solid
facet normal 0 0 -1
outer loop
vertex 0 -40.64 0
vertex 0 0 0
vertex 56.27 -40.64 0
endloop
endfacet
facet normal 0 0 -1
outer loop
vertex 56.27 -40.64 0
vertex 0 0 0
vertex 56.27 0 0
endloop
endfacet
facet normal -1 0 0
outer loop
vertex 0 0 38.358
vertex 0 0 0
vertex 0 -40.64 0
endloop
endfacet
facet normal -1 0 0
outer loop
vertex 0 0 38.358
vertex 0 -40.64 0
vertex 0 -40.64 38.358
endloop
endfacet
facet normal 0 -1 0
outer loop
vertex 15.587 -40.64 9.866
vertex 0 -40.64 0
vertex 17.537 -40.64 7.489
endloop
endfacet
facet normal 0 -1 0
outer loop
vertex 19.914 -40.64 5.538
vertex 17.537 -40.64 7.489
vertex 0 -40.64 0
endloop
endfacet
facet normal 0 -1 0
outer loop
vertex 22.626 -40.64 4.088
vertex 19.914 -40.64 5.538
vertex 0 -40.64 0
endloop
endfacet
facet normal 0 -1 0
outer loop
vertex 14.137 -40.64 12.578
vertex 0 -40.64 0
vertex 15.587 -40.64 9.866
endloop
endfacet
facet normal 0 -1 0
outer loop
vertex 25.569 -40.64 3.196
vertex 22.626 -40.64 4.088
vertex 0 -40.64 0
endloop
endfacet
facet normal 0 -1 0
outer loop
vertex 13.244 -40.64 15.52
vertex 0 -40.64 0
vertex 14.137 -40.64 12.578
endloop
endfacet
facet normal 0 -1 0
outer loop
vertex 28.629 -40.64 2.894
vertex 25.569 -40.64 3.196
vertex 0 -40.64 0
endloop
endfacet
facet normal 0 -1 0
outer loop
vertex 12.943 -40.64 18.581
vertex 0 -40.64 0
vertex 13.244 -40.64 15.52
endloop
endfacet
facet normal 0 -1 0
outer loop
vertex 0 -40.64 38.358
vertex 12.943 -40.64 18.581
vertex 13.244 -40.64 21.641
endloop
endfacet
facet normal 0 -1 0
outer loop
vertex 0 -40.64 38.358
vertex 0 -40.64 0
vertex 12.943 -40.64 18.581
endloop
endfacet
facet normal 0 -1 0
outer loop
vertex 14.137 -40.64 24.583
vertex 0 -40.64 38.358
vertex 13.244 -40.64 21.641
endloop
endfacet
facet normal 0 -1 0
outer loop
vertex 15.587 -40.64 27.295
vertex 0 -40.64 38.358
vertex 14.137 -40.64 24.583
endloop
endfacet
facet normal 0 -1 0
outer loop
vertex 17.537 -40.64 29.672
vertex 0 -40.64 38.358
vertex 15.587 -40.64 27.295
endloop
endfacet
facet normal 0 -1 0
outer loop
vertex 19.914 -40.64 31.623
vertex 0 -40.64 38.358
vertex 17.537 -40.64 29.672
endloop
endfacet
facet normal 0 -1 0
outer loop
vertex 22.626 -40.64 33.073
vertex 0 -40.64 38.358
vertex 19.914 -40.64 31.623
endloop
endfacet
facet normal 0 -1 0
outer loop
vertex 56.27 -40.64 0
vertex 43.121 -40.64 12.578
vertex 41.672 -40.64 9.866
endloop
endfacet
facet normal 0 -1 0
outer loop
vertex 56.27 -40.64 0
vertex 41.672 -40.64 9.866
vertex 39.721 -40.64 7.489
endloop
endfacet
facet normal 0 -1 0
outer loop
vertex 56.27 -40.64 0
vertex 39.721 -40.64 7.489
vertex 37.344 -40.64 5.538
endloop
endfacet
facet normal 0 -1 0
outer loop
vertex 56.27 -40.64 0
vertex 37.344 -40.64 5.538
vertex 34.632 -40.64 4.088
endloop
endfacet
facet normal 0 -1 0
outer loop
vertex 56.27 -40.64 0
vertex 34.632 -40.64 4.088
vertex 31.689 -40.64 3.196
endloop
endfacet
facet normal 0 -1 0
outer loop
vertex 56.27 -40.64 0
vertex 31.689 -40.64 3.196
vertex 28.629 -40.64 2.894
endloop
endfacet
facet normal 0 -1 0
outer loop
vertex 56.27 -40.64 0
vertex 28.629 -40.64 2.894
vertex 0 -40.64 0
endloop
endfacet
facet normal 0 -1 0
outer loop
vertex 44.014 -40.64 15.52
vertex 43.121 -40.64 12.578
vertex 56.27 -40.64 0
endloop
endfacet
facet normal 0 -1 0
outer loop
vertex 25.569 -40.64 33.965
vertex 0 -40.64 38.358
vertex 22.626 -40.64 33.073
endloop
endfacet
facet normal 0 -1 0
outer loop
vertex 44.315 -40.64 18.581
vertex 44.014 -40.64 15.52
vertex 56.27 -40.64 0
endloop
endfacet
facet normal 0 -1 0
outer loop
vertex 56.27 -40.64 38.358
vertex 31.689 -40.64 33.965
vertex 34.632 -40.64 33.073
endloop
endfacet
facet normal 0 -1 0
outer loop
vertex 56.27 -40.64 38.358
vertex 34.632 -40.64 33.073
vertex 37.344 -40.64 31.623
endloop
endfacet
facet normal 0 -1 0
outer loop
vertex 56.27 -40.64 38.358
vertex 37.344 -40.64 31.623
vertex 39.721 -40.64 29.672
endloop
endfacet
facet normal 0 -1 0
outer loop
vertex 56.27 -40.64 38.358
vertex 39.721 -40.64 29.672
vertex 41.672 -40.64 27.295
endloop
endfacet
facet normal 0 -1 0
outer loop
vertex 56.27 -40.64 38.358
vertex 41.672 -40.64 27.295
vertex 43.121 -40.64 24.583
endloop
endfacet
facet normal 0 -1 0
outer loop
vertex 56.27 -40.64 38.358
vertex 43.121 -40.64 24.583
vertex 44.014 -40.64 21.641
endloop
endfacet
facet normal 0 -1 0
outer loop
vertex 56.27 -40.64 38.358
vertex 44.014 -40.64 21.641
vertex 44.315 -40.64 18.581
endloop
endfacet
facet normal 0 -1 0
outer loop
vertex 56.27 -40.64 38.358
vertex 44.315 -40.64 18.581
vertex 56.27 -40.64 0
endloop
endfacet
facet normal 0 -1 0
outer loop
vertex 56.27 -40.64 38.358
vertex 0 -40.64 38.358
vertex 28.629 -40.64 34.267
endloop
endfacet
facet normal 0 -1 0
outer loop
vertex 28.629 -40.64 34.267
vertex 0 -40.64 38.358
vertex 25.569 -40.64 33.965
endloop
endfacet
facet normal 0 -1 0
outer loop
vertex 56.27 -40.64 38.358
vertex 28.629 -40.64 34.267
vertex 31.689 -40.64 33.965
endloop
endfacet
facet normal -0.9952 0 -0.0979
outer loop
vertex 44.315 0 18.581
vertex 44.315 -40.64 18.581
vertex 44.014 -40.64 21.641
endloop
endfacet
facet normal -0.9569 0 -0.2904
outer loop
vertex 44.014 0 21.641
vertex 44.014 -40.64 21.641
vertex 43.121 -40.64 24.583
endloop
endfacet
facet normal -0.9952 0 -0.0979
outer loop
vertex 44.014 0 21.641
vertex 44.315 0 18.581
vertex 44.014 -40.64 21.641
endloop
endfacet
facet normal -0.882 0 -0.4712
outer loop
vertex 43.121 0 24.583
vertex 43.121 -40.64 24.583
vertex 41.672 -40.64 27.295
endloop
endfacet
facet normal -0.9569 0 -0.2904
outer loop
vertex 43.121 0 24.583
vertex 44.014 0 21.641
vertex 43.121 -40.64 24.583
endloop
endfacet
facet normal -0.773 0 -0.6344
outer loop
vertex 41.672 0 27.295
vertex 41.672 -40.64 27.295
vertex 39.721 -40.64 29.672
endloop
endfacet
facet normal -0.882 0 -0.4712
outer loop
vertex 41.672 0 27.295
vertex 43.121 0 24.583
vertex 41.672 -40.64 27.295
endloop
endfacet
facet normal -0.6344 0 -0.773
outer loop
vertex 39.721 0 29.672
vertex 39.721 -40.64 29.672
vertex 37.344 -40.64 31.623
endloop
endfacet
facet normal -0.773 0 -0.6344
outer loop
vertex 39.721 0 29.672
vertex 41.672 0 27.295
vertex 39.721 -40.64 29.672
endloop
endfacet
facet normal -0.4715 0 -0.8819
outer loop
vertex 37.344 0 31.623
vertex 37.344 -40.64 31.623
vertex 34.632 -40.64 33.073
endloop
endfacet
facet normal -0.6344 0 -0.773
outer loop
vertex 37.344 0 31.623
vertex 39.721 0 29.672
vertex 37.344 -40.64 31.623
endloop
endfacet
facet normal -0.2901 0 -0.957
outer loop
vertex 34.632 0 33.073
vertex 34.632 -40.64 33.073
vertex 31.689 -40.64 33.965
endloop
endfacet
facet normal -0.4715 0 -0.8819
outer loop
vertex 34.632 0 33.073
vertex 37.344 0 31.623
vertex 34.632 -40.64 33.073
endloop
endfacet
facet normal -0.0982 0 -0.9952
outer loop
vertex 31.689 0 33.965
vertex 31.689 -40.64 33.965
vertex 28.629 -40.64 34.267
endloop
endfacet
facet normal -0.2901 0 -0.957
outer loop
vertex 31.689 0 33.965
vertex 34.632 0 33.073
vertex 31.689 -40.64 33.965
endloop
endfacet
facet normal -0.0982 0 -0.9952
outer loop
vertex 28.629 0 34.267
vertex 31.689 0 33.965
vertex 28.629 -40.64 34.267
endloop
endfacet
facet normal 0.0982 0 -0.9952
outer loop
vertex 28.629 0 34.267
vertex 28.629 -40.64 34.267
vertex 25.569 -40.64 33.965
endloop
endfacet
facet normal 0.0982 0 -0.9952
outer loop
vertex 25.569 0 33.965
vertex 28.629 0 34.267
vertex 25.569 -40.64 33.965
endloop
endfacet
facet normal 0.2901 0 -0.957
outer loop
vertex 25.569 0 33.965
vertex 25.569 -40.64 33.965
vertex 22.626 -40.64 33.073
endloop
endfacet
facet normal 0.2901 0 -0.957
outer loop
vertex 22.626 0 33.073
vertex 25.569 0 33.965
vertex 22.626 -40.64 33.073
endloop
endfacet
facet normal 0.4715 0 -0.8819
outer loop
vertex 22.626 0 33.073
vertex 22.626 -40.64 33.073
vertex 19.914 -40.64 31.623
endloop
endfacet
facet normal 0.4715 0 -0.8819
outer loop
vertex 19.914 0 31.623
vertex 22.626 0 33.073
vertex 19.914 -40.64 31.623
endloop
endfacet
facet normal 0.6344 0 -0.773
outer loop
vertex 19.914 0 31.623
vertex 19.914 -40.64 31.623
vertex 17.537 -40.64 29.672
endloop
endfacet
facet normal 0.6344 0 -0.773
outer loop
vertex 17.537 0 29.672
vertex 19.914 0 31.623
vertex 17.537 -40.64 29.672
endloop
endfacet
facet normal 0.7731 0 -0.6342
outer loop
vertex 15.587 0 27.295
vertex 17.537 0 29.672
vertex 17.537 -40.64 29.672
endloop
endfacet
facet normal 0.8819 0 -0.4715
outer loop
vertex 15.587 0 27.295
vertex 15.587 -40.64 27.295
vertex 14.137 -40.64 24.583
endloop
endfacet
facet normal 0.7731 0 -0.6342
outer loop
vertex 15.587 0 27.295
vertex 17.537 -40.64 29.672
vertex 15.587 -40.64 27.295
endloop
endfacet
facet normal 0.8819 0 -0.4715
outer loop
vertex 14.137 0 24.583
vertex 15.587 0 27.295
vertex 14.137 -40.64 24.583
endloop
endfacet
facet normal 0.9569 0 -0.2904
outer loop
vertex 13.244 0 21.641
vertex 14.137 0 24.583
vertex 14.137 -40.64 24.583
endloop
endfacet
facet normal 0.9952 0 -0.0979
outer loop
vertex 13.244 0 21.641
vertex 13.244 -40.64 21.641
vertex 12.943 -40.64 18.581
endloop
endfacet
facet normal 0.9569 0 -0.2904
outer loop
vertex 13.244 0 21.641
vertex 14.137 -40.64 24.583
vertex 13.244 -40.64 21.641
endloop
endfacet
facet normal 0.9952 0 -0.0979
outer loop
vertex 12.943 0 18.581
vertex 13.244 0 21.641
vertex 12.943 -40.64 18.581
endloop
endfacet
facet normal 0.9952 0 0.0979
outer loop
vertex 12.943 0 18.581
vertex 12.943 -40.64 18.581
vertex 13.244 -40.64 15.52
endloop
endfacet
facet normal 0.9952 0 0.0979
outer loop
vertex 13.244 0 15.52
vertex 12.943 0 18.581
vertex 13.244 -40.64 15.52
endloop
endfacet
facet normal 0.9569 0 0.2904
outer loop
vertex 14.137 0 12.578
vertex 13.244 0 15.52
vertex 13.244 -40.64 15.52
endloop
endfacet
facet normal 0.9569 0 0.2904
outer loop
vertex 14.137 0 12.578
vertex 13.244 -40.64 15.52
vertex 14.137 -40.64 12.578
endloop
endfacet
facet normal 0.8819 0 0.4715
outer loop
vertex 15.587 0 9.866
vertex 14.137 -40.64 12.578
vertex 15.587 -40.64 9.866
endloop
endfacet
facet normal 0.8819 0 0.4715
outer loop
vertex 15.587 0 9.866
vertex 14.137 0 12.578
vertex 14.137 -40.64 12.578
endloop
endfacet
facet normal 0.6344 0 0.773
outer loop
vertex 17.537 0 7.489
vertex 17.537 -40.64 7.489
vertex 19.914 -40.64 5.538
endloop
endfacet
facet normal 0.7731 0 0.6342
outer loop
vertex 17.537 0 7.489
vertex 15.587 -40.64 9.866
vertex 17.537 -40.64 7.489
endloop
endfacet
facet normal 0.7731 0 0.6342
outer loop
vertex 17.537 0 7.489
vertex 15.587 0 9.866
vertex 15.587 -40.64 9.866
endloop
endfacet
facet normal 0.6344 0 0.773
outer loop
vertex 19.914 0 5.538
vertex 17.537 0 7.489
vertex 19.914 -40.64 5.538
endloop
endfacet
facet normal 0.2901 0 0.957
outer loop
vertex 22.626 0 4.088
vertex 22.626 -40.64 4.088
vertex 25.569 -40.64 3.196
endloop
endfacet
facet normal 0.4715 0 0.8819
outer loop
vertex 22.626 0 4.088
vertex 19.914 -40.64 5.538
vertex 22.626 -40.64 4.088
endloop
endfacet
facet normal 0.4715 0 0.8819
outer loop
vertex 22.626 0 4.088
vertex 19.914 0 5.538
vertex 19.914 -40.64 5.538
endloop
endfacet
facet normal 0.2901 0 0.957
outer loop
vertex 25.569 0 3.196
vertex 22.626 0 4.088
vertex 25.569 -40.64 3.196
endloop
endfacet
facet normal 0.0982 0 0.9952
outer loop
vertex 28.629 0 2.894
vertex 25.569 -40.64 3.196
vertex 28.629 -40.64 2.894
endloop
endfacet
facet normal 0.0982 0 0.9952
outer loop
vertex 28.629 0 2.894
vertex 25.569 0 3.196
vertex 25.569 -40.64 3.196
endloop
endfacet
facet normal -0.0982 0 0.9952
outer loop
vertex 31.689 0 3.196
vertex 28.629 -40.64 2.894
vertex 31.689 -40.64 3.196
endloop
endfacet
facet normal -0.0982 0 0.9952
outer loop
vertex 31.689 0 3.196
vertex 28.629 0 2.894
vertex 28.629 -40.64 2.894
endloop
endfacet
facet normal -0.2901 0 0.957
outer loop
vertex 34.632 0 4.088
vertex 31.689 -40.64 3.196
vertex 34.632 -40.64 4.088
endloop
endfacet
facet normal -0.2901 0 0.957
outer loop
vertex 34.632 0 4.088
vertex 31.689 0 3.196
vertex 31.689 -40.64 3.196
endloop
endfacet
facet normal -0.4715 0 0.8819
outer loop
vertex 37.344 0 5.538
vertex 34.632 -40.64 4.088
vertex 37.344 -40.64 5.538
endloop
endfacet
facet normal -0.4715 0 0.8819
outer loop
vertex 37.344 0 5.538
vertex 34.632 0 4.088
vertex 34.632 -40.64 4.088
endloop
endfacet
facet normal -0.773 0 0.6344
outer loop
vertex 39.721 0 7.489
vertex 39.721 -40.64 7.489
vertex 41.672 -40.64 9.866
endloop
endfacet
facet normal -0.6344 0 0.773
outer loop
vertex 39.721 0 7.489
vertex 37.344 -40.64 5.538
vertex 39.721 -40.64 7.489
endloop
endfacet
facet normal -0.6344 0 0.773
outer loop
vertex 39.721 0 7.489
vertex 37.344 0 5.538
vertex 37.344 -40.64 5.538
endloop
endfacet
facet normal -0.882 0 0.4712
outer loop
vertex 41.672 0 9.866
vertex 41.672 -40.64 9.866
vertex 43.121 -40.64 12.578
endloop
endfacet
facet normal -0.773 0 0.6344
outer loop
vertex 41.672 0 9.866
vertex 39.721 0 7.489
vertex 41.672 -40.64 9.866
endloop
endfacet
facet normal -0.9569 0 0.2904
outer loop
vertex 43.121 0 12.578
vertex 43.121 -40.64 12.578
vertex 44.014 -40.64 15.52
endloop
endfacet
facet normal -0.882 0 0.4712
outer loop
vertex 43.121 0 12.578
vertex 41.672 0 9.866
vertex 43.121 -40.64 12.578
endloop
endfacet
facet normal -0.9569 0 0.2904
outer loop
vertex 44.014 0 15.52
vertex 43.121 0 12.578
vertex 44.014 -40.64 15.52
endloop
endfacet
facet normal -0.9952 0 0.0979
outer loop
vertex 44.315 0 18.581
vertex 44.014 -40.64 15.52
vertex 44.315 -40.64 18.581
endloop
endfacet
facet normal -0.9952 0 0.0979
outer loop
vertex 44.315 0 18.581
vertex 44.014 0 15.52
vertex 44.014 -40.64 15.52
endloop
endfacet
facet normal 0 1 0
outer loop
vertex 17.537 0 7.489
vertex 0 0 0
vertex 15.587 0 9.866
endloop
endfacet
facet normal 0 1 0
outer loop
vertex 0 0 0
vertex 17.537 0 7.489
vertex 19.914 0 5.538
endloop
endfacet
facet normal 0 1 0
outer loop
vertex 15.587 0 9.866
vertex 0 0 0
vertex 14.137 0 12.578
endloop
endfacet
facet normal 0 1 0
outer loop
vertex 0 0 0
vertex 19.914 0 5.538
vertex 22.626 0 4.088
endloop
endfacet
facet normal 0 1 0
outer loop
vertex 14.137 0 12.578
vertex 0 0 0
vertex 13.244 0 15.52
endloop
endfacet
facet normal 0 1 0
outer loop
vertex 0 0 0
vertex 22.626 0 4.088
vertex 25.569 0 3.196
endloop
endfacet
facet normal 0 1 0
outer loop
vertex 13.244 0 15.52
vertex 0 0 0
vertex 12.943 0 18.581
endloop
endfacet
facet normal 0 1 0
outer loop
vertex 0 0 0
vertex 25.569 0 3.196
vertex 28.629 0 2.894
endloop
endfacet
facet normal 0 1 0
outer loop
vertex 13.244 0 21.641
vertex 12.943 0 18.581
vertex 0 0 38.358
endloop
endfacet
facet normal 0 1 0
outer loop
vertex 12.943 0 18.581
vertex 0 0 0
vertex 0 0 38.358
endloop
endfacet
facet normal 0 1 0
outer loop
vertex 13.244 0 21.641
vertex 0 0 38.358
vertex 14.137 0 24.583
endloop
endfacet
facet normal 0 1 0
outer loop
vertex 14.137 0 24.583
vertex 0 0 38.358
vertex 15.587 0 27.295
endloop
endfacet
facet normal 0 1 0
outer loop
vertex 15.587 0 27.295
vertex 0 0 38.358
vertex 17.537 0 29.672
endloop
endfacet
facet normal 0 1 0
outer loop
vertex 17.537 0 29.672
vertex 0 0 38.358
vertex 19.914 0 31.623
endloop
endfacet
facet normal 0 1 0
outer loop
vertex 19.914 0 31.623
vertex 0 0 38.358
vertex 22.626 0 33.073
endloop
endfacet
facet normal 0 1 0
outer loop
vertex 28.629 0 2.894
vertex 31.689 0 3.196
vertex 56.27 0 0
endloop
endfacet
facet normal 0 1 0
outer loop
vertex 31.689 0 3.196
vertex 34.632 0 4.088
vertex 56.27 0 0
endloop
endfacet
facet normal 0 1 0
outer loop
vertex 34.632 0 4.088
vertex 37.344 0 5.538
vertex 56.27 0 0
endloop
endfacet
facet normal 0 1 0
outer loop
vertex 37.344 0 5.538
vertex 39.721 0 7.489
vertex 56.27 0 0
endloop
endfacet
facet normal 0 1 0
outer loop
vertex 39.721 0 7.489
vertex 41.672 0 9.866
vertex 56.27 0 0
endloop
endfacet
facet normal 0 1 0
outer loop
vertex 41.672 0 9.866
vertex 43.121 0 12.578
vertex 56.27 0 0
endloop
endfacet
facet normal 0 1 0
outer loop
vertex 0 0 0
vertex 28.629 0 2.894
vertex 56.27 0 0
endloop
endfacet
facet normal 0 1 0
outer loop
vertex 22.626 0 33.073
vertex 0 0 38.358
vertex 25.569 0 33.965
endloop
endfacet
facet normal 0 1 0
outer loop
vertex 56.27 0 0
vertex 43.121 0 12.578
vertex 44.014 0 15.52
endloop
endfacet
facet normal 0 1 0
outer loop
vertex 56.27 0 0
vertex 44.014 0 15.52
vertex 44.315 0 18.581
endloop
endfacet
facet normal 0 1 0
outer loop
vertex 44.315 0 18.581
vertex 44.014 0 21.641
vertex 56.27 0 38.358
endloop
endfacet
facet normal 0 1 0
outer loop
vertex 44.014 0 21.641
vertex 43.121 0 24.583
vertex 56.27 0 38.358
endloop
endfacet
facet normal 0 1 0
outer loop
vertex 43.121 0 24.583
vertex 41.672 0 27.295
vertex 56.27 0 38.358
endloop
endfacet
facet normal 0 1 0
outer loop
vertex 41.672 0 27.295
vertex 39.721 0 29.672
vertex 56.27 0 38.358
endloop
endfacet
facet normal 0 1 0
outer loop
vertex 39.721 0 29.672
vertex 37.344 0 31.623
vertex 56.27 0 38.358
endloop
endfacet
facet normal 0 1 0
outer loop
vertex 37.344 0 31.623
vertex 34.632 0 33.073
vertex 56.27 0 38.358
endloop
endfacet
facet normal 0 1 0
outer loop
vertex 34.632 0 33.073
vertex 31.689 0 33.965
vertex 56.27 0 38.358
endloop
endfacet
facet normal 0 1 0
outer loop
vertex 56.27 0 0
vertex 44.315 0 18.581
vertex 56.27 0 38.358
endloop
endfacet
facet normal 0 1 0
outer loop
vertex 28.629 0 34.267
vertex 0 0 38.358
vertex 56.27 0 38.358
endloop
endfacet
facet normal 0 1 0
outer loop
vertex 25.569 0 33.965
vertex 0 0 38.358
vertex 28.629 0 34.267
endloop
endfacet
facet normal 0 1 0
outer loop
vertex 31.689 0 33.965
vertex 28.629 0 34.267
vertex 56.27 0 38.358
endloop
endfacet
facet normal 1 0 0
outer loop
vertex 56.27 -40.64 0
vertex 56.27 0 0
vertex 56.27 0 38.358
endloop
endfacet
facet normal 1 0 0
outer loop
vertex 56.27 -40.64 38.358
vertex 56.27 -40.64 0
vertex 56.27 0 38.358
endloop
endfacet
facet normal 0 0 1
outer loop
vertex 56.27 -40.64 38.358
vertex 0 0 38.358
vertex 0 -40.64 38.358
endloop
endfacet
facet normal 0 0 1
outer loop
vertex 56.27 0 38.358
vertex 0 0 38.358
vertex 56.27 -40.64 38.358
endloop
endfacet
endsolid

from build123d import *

# Parameters (mm, degrees)
F0_W     = 56.269944
F0_H     = 38.358275
F1_DEPTH = 40.64
F2_R     = 15.686232
F3_DEPTH = 40.641


with BuildPart() as f1:
    # F0 (on Front) → F1 (new body)
    with BuildSketch(Plane.XZ):
        with Locations((28.134972, 19.179137)):
            Rectangle(F0_W, F0_H)
    extrude(amount=F1_DEPTH)

    # F2 (on Front) → F3 (cut, through all)
    with BuildSketch(Plane.XZ):
        with Locations((28.629173, 18.580522)):
            Circle(F2_R)
    extrude(amount=F3_DEPTH, mode=Mode.SUBTRACT)


solid = f1.part
